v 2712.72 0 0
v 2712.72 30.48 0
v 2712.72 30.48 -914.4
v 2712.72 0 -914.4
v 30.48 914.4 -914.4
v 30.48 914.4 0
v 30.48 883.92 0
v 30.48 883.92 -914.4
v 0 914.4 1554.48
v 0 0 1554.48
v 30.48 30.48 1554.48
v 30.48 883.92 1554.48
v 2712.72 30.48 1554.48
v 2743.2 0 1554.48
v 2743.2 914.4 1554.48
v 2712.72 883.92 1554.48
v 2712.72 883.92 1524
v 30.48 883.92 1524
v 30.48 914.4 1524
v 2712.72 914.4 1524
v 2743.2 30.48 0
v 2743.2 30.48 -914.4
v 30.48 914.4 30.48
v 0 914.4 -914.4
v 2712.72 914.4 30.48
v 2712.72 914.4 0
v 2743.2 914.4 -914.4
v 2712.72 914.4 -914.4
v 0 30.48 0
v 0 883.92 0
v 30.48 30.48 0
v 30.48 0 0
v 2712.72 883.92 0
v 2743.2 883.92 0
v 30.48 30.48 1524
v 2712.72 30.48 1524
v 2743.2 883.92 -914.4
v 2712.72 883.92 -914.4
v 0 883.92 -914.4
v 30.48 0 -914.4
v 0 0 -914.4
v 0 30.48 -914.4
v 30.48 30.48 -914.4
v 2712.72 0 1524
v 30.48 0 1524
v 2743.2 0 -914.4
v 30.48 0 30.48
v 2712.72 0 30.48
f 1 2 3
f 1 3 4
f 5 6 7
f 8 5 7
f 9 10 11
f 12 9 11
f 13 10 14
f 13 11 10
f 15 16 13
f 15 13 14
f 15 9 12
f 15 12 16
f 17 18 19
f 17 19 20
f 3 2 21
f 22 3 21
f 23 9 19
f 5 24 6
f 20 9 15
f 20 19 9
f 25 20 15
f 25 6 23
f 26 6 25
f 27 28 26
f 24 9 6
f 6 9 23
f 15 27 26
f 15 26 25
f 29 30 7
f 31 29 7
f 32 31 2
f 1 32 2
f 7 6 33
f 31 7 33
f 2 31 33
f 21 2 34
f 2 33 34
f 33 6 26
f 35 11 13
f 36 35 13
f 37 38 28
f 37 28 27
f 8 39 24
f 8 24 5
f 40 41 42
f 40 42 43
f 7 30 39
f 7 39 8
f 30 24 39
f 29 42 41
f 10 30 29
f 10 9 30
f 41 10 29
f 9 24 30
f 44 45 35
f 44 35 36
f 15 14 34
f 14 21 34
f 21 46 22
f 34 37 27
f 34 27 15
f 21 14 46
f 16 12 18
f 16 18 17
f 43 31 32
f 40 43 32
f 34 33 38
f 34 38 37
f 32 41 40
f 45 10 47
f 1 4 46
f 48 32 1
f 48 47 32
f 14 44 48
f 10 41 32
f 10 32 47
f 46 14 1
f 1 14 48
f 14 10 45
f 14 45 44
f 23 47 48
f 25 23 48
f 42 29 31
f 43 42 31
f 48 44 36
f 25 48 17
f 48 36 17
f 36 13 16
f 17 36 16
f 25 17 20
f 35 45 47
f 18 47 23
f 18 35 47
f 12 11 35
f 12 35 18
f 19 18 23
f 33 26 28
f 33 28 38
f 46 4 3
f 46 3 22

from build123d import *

# Parameters (mm, degrees)
F0_W      = 2743.2
F0_H      = 914.4
F1_DEPTH  = 30.48
F2_W      = 2743.2
F2_H      = 914.4
F3_DEPTH  = 1524
F4_W      = 2682.24
F4_H      = 853.44
F5_DEPTH  = 1554.48
F6_W      = 2682.24
F6_H      = 1493.52
F7_DEPTH  = 914.4
F8_W      = 2682.24
F8_H      = 30.48
F9_DEPTH  = 853.44
F10_W     = 30.48
F10_H     = 30.48
F11_DEPTH = 914.4


with BuildPart() as f1:
    # F0 (on Top) → F1 (new body)
    with BuildSketch(Plane.XY):
        with Locations((1371.6, 457.2)):
            Rectangle(F0_W, F0_H)
    extrude(amount=F1_DEPTH)

    # F2 (on face) → F3 (join)
    with BuildSketch(Plane.XY.offset(30.48)):
        with Locations((1371.6, 457.2)):
            Rectangle(F2_W, F2_H)
    extrude(amount=F3_DEPTH)

    # F4 (on face) → F5 (cut, through all)
    with BuildSketch(Plane.XY.offset(1554.48)):
        with Locations((1371.6, 457.2)):
            Rectangle(F4_W, F4_H)
    extrude(amount=-F5_DEPTH, mode=Mode.SUBTRACT)

    # F6 (on face) → F7 (cut)
    with BuildSketch(Plane.XZ):
        with Locations((1371.6, 777.24)):
            Rectangle(F6_W, F6_H)
    extrude(amount=-F7_DEPTH, mode=Mode.SUBTRACT)

    # F8 (on face) → F9 (join, through all)
    with BuildSketch(Plane.XZ.offset(-883.92)):
        with Locations((1371.6, 15.24)):
            Rectangle(F8_W, F8_H)
    extrude(amount=F9_DEPTH)

    # F10 (on face) → F11 (join)
    with BuildSketch(Plane(origin=(0, 0, 0), x_dir=(1, 0, 0), z_dir=(0, 0, -1))):
        with Locations((15.24, -15.24)):
            Rectangle(F10_W, F10_H)
        with Locations((15.24, -899.16)):
            Rectangle(F10_W, F10_H)
        with Locations((2727.96, -15.24)):
            Rectangle(F10_W, F10_H)
        with Locations((2727.96, -899.16)):
            Rectangle(F10_W, F10_H)
    extrude(amount=F11_DEPTH)


solid = f1.part
